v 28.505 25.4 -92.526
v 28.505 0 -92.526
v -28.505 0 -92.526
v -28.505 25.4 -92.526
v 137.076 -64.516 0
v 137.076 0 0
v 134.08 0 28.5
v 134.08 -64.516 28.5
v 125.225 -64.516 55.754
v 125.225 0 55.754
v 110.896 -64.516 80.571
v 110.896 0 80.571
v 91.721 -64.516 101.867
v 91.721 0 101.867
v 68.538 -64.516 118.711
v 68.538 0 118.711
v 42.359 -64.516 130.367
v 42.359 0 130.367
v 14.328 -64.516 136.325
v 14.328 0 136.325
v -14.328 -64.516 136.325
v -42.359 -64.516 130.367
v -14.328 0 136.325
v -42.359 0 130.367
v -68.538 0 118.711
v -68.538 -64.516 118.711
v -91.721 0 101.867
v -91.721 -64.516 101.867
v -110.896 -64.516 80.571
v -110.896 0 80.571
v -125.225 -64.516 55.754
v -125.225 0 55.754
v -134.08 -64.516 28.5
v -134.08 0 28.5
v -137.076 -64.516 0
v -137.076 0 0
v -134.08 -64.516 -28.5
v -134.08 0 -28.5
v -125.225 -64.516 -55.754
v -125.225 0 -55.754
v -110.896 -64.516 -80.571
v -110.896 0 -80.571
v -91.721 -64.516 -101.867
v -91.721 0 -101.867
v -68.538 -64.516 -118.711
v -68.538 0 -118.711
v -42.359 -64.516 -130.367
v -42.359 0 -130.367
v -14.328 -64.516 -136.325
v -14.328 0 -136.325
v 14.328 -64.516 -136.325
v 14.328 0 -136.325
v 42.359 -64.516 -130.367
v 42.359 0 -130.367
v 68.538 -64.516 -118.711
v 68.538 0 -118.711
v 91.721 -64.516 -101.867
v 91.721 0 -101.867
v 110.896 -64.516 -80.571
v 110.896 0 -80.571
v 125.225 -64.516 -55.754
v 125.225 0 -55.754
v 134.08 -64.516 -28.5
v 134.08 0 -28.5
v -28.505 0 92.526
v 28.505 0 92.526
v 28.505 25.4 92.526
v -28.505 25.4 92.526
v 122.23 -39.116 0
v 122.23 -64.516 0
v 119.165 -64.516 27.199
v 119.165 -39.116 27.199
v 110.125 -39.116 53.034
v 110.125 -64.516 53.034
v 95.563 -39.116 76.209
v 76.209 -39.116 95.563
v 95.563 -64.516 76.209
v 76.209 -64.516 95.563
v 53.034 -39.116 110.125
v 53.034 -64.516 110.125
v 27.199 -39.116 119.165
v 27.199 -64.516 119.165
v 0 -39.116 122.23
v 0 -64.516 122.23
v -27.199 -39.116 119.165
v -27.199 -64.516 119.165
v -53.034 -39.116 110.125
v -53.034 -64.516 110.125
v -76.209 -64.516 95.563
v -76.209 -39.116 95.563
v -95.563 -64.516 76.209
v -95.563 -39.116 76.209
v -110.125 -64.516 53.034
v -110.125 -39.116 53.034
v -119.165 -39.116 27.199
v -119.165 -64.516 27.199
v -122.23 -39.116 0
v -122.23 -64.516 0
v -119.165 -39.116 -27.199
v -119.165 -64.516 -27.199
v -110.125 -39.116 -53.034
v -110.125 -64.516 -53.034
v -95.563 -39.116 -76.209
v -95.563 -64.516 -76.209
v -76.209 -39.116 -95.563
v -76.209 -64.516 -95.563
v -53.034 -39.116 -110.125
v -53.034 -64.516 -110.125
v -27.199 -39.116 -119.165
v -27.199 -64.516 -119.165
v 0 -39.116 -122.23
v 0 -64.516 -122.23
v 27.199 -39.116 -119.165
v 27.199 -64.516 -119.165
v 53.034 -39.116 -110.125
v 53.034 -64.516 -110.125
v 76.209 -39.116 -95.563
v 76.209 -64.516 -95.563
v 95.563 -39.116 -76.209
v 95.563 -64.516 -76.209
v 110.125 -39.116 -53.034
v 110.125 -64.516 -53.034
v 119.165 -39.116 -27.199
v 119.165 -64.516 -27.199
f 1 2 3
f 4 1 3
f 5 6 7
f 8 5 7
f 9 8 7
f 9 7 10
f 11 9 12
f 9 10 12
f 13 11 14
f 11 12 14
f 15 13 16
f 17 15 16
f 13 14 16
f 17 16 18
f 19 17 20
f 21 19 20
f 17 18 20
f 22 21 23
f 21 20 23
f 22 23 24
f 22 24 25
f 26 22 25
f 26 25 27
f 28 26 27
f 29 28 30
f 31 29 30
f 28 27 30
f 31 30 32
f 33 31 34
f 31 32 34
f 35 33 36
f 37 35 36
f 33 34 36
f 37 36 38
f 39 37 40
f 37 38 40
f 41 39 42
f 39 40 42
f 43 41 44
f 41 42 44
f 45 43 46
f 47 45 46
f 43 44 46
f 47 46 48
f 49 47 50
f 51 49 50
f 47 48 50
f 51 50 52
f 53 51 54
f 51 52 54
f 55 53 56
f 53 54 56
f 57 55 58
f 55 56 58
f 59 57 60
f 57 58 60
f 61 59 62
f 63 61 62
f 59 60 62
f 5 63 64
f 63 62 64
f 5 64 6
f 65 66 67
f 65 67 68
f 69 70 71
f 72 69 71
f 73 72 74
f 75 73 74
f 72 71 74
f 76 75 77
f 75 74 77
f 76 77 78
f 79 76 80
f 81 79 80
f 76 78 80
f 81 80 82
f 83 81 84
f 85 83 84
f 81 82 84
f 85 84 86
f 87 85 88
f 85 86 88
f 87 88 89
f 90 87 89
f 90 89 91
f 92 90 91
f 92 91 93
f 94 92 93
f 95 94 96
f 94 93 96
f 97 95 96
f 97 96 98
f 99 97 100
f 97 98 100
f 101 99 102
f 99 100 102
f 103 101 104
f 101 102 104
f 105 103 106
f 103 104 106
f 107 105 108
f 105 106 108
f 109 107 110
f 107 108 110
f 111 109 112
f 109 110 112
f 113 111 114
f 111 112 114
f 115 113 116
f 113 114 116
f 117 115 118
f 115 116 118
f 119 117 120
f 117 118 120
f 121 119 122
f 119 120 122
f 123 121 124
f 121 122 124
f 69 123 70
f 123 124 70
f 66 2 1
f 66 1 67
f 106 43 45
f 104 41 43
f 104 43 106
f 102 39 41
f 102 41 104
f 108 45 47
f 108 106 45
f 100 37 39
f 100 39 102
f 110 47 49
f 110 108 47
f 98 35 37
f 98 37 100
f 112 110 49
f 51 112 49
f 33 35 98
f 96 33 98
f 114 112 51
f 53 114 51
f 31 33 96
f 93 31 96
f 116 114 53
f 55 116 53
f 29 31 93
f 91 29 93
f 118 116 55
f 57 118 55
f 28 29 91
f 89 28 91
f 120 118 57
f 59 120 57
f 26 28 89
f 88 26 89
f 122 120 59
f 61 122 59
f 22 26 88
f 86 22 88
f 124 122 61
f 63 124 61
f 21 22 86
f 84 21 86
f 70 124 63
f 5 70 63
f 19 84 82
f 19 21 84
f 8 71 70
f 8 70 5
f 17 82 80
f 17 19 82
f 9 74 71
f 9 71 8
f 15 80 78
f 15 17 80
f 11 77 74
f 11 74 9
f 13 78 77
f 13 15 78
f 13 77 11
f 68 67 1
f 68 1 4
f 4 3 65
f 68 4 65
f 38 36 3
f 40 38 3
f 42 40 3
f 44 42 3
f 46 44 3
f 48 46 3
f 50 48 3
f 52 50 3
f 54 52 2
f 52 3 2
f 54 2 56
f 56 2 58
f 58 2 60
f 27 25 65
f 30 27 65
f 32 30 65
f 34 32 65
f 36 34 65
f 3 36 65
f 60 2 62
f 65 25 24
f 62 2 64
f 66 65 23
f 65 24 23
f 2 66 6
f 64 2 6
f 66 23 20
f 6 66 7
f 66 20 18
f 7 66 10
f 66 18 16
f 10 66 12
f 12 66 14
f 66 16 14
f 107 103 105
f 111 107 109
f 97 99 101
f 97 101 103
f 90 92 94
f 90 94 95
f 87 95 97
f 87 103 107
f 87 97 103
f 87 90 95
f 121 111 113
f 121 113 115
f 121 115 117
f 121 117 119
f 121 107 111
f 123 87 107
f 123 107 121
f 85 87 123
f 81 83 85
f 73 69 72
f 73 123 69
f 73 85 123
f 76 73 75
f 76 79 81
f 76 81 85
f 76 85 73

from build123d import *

# Parameters (mm, degrees)
F0_R     = 137.07557
F1_DEPTH = 64.516
F2_R     = 122.229909
F3_DEPTH = 25.4
F4_W     = 57.010982
F4_H     = 185.052022
F5_DEPTH = 25.4


with BuildPart() as f1:
    # F0 (on Front) → F1 (new body)
    with BuildSketch(Plane.XZ):
        Circle(F0_R)
    extrude(amount=F1_DEPTH)

    # F2 (on face) → F3 (cut)
    with BuildSketch(Plane.XZ.offset(64.516)):
        Circle(F2_R)
    extrude(amount=-F3_DEPTH, mode=Mode.SUBTRACT)

    # F4 (on face) → F5 (join)
    with BuildSketch(Plane(origin=(0, 0, 0), x_dir=(-1, 0, 0), z_dir=(0, 1, 0))):
        Rectangle(F4_W, F4_H)
    extrude(amount=F5_DEPTH)


solid = f1.part
